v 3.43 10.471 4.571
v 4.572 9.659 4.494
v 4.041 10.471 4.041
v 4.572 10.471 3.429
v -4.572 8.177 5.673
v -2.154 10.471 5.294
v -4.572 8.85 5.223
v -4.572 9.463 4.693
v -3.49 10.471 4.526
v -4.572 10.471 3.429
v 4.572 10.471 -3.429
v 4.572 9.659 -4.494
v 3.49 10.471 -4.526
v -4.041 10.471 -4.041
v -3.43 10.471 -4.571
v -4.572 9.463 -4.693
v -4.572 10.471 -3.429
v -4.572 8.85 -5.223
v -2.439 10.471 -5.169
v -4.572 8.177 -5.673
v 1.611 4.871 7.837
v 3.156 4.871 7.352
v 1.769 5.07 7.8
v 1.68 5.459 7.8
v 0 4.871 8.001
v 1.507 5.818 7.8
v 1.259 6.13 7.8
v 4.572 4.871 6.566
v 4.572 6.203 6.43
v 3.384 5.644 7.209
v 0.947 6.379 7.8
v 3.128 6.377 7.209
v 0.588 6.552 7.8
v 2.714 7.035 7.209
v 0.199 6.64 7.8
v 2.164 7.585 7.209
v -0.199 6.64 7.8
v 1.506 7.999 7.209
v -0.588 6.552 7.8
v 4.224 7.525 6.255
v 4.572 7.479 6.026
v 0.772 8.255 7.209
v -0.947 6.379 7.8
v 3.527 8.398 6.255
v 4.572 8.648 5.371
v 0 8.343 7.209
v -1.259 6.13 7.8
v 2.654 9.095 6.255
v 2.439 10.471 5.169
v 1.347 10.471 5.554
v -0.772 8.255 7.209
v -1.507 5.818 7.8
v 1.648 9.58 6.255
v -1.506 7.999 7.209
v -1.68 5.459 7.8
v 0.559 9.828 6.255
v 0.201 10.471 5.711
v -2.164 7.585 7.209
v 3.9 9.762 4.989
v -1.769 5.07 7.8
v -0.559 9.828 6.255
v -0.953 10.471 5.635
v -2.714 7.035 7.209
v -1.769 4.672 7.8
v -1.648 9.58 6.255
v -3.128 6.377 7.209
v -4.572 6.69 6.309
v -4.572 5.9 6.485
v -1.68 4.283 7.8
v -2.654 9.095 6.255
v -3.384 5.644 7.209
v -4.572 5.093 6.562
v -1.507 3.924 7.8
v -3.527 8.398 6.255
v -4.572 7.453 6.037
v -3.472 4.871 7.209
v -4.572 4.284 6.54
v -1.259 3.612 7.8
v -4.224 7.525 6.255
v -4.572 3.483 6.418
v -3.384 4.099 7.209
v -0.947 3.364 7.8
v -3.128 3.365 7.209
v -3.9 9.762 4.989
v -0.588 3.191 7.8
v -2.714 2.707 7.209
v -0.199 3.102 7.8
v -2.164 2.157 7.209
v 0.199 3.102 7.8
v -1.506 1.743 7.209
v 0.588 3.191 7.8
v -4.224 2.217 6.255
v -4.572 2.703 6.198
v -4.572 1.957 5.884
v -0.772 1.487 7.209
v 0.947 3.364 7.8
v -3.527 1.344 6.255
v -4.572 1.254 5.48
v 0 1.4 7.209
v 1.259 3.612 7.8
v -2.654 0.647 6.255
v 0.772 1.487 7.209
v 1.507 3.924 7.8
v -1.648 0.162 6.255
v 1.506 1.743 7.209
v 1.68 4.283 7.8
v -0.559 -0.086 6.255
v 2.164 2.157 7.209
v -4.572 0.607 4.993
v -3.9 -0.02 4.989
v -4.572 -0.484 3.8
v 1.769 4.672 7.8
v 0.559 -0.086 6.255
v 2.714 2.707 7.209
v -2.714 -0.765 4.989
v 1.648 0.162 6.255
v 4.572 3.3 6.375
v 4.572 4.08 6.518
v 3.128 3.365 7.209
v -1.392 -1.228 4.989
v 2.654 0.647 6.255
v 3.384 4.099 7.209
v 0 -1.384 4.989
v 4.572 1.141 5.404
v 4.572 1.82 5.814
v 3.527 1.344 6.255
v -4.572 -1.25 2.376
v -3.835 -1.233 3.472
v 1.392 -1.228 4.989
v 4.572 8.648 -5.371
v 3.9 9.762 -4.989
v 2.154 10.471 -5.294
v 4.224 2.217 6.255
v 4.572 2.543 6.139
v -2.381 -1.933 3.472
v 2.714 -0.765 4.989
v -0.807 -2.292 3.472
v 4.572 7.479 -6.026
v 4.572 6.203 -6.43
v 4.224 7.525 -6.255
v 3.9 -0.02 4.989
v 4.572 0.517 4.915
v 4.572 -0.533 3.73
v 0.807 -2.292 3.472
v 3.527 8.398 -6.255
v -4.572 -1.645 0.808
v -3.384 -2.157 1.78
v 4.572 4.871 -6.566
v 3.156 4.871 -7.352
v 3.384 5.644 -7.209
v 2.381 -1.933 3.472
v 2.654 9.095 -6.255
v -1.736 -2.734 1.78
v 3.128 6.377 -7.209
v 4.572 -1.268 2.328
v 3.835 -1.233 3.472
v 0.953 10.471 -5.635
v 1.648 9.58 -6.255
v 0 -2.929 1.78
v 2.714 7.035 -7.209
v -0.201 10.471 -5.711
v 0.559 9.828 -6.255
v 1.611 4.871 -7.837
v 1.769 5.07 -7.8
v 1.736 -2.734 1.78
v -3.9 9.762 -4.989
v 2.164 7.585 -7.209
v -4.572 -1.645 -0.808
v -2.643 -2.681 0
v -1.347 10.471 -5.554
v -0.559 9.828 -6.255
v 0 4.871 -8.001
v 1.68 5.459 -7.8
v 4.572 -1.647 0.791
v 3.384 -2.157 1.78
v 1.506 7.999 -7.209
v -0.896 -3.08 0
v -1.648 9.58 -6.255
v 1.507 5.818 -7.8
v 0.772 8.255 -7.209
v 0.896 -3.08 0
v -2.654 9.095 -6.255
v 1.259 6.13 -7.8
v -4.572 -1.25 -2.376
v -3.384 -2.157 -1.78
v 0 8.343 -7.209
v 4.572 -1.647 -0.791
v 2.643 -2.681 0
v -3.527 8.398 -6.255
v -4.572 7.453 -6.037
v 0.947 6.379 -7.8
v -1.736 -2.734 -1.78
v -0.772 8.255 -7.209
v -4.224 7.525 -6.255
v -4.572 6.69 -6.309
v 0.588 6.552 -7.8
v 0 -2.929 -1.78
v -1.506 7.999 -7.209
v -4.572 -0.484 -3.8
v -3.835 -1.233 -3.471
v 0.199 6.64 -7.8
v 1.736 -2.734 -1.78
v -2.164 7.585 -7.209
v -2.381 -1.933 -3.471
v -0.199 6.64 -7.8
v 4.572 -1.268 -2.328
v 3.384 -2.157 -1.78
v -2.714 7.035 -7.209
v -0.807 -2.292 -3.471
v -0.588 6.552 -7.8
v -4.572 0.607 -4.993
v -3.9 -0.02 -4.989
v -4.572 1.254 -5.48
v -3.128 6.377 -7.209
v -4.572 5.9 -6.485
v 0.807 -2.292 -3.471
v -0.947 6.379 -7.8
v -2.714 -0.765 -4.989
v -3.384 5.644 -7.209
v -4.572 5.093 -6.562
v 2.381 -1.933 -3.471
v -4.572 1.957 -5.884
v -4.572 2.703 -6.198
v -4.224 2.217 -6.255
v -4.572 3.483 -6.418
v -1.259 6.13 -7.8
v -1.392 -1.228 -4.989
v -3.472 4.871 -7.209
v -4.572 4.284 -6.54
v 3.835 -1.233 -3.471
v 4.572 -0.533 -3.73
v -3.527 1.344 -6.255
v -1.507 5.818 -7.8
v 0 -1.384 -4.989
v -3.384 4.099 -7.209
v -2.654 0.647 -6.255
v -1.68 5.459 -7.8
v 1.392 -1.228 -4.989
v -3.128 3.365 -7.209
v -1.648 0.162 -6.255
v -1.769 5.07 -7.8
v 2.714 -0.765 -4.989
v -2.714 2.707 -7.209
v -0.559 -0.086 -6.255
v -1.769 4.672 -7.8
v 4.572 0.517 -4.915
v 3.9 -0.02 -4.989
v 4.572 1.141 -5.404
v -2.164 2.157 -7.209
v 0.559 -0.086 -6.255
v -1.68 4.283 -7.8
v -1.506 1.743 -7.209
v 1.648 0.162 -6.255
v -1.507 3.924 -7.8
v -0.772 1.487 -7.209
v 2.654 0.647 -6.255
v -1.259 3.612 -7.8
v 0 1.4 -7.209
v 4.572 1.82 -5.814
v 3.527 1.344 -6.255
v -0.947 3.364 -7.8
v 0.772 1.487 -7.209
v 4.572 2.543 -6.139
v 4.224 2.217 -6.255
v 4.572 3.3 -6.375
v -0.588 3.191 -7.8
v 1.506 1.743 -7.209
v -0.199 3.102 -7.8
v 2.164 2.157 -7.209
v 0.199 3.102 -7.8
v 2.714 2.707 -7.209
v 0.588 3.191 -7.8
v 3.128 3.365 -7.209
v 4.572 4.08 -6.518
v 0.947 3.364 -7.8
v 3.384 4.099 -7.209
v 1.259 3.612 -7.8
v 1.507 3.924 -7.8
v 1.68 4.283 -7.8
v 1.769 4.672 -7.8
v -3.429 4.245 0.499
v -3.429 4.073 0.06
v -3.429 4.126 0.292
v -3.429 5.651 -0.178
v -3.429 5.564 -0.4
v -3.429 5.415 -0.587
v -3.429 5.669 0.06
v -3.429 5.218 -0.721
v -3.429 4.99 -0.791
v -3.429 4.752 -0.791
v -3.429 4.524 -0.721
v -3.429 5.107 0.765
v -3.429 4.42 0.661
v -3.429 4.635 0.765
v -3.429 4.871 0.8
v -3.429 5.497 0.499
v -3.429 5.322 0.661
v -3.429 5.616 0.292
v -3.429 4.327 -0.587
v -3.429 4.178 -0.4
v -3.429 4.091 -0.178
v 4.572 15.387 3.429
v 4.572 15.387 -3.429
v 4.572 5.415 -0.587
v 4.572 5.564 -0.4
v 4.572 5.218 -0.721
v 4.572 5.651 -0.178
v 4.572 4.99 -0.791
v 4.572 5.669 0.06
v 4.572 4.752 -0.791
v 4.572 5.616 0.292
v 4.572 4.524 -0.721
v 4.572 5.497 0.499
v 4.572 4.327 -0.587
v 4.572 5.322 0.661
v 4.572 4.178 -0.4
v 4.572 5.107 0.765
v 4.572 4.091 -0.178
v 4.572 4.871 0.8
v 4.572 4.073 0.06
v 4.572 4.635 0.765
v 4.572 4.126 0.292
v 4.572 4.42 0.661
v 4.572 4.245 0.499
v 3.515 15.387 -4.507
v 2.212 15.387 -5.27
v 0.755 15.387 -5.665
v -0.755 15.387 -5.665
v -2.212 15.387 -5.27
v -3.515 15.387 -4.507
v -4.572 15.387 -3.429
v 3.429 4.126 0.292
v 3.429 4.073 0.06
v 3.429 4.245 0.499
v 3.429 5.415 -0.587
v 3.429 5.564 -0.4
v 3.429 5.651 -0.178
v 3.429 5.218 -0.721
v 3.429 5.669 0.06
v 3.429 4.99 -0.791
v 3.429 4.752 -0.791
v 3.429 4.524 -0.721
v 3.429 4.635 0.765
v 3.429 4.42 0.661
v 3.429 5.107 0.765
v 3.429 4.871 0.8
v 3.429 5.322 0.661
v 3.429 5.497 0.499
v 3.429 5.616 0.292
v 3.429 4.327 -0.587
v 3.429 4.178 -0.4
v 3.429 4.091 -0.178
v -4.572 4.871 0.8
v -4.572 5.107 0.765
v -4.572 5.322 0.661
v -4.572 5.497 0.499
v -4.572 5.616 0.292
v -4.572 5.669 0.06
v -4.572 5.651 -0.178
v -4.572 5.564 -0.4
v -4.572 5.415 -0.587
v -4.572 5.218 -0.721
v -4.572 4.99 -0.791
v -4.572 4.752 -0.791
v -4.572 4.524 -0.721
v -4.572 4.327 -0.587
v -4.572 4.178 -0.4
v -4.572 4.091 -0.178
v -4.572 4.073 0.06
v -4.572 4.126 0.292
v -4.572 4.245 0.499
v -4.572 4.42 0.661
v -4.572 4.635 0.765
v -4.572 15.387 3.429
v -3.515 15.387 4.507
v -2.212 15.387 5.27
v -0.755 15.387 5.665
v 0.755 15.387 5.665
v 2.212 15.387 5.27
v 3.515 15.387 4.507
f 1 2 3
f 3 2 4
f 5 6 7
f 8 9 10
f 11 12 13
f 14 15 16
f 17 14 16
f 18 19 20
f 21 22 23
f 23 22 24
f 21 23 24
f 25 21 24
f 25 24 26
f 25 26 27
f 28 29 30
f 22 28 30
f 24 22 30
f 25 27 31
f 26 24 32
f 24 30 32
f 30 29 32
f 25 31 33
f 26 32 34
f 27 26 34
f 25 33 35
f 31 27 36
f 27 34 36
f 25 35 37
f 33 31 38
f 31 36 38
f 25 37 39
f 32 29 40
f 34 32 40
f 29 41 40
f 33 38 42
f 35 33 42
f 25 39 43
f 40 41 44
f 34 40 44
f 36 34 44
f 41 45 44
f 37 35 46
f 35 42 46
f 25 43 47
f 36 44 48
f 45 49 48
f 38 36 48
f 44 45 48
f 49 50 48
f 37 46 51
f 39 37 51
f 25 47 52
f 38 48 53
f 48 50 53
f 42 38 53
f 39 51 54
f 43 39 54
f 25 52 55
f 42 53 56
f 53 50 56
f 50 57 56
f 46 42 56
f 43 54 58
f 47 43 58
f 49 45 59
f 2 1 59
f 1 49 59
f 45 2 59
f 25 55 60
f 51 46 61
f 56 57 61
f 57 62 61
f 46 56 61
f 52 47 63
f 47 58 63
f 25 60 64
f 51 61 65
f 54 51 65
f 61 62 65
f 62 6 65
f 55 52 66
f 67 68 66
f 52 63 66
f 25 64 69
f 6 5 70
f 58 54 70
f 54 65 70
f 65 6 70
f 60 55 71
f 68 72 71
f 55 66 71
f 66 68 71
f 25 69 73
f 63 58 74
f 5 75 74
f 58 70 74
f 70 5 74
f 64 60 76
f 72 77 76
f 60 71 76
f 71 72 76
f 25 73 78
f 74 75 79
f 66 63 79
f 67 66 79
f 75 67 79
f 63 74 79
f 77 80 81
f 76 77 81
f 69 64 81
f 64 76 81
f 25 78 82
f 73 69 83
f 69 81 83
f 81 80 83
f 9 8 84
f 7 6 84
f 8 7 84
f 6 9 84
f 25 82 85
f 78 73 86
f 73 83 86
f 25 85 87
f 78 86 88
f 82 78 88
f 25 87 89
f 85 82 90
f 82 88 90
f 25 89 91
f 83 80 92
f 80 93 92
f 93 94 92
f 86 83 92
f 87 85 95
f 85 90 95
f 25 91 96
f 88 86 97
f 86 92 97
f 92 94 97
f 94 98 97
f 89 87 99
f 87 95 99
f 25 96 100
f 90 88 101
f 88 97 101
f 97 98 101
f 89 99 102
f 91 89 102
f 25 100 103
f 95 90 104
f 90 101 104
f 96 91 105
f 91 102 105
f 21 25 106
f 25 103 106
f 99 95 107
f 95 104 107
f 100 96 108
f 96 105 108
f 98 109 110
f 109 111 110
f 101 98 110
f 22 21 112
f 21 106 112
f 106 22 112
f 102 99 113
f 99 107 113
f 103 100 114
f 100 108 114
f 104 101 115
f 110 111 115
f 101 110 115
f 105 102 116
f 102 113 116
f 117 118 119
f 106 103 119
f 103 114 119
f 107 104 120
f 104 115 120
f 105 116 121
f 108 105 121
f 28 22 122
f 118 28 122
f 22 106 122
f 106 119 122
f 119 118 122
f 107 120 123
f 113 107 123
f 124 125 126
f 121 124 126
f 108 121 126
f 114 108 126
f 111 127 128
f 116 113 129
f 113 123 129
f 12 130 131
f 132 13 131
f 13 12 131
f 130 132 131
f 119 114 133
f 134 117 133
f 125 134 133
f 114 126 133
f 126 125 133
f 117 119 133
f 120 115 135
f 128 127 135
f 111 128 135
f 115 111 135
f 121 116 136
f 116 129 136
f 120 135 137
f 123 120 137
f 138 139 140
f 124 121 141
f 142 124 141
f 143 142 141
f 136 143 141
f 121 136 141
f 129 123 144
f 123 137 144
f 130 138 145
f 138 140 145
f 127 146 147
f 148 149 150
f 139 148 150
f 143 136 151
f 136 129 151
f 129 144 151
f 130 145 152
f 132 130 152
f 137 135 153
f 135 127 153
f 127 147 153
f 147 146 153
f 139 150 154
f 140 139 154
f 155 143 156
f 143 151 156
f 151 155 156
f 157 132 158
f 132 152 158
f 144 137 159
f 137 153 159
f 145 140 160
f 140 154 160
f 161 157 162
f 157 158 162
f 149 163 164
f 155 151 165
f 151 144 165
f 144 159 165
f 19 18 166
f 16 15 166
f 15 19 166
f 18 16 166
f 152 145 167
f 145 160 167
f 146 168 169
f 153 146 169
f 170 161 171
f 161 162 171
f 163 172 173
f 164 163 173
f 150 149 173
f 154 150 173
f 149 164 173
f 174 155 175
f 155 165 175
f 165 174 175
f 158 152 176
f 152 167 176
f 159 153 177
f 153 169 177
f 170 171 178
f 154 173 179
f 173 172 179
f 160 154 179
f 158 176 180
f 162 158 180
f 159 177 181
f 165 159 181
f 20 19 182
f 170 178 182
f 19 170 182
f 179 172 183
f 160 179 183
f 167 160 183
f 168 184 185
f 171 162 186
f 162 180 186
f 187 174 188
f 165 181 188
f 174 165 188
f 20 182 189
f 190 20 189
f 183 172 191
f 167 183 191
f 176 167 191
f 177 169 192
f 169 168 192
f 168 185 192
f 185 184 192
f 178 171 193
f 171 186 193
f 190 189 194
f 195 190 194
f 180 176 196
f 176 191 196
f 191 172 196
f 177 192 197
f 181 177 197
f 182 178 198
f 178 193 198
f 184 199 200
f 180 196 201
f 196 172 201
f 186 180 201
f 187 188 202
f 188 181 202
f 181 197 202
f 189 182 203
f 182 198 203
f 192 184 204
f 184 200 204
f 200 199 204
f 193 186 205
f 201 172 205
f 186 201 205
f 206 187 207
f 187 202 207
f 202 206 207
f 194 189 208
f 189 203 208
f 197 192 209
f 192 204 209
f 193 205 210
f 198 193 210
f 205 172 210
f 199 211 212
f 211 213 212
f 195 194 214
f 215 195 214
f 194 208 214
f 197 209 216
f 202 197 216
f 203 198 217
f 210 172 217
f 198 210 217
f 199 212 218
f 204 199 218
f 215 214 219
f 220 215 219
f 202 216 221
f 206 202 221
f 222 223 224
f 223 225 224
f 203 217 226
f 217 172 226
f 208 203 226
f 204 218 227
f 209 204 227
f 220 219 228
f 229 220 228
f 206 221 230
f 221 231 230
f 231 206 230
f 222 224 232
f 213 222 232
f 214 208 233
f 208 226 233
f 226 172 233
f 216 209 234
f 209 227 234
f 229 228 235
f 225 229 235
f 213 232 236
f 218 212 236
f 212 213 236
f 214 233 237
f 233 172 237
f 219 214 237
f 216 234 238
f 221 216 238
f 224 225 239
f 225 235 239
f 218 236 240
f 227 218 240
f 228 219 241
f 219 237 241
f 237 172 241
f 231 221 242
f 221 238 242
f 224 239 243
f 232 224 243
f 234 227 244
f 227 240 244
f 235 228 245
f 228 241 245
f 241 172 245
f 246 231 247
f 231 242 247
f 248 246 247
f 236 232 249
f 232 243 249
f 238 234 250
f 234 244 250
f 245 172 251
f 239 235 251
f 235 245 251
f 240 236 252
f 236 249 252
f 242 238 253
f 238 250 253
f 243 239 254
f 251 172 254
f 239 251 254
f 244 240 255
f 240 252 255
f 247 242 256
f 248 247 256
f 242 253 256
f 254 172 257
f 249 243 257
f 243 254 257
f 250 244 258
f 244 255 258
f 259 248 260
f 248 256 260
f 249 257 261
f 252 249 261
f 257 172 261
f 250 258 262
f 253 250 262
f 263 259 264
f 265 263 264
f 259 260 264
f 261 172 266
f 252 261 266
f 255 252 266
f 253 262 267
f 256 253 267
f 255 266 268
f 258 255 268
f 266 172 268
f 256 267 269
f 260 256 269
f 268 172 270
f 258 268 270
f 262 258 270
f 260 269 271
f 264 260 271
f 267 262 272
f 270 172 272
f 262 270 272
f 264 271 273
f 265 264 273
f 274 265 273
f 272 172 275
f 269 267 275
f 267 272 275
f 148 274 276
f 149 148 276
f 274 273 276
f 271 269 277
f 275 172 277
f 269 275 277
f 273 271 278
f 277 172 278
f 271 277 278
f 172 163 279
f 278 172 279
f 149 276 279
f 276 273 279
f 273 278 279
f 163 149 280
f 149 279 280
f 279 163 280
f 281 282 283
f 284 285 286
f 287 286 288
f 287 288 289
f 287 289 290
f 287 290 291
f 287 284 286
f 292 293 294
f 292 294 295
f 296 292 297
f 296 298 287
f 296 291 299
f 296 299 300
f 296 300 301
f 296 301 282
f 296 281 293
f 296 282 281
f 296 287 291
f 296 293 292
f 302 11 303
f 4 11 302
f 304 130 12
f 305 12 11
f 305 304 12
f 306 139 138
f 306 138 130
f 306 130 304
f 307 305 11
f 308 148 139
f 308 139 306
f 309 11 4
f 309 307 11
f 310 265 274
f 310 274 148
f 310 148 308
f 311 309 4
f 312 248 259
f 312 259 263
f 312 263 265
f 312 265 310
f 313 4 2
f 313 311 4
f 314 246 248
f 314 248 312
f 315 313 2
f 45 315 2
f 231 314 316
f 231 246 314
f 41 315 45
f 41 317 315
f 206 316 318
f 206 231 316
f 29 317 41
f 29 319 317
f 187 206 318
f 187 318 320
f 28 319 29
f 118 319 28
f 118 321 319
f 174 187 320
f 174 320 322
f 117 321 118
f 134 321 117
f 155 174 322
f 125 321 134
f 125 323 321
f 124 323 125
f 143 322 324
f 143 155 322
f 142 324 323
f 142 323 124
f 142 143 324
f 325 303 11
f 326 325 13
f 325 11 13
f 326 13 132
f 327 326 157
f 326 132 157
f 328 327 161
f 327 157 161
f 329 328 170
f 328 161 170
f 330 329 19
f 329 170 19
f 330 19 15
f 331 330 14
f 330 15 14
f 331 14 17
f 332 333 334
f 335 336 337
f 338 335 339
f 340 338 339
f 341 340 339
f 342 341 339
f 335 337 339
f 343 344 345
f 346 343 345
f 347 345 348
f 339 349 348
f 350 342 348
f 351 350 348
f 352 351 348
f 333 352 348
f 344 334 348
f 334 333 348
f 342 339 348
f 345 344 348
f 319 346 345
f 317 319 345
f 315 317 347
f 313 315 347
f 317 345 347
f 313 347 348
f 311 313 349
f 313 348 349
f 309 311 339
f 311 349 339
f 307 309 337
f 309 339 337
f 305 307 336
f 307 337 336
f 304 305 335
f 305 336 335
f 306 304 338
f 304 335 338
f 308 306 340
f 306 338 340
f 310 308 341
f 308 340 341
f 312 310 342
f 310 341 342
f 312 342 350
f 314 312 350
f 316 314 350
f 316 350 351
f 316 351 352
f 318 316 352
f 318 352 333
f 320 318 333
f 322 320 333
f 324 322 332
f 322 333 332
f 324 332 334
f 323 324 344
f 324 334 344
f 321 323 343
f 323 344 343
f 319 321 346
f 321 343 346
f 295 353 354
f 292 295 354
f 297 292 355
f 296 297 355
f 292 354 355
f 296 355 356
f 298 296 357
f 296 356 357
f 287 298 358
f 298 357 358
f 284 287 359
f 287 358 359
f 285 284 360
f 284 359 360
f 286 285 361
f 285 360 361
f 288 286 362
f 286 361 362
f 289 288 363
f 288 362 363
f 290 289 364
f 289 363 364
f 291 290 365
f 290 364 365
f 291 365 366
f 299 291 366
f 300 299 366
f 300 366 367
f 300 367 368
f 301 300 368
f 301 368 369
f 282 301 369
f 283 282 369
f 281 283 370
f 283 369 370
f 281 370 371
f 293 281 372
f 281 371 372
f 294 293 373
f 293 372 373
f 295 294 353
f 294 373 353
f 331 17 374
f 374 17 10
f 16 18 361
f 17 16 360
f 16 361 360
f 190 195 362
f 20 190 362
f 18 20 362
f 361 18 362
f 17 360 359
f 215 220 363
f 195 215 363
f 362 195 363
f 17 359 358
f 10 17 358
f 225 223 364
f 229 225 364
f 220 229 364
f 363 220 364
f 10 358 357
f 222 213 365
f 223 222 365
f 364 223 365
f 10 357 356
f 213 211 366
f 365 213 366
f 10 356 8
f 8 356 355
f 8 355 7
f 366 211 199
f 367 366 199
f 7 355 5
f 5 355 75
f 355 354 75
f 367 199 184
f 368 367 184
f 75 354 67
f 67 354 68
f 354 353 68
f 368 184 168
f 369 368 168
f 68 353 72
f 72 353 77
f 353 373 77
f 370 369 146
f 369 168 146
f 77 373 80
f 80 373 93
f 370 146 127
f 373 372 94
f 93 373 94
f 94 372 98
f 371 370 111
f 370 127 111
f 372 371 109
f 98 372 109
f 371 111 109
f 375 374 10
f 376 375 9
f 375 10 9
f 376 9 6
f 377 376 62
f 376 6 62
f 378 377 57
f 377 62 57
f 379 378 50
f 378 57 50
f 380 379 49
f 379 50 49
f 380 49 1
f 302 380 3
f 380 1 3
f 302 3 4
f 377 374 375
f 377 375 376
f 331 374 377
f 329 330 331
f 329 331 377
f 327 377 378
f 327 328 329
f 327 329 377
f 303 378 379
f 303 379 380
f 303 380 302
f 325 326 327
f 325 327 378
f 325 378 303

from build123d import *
from build123d.topology import SkipClean

# Parameters (mm, degrees)
CUT_EXTRUDE1_DEPTH      = 35
CUT_EXTRUDE1_DEPTH_BACK = 35
SKETCH2_OUTSIDE_W       = 96.248
SKETCH2_OUTSIDE_H       = 96.248
BOSS_EXTRUDE1_DEPTH     = 46
SKETCH4_R               = 3.5
CUT_EXTRUDE2_DEPTH      = 5
LPATTERN1_COUNT         = 2
LPATTERN1_PITCH         = 35
SCALE1_SCALE            = 0.2286


with BuildPart() as part:
    # Sketch1 → Revolve2 (revolve)
    with BuildSketch(Plane(origin=(0, 0, 0), x_dir=(1, 0, 0), z_dir=(0, 1, 0))):
        with BuildLine():
            Line((0, 35), (0, -35))
            ThreePointArc((0, -35), (35, 0), (0, 35))
        make_face()
    revolve(axis=Axis((0, 0, -35), (0, 0, 1)))

    # Sketch2 outside → Cut-Extrude1 (cut, two sides: drawn at the far end of the back side and taken through both)
    with SkipClean():  # the faces are left unmerged after this step: merging them gives an invalid solid
        with BuildSketch(Plane(origin=(0, 0, 0), x_dir=(1, 0, 0), z_dir=(0, 1, 0)).offset(-CUT_EXTRUDE1_DEPTH_BACK)):
            Rectangle(SKETCH2_OUTSIDE_W, SKETCH2_OUTSIDE_H)
            with BuildLine():
                Line((-20, -28.722813233), (-20, 28.722813233))
                ThreePointArc((-20, 28.722813233), (0, 35), (20, 28.722813233))
                Line((20, 28.722813233), (20, -28.722813233))
                ThreePointArc((20, -28.722813233), (0, -35), (-20, -28.722813233))
            make_face(mode=Mode.SUBTRACT)
        extrude(amount=CUT_EXTRUDE1_DEPTH + CUT_EXTRUDE1_DEPTH_BACK, mode=Mode.SUBTRACT)

    # Sketch3 → Boss-Extrude1 (add)
    with BuildSketch(Plane(origin=(0, 0, 0), x_dir=(1, 0, 0), z_dir=(0, 1, 0))):
        with BuildLine():
            Line((-20, 15), (-20, -15))
            ThreePointArc((-20, -15), (0, -25), (20, -15))
            Line((20, -15), (20, 15))
            ThreePointArc((20, 15), (0, 25), (-20, 15))
        make_face()
    extrude(amount=BOSS_EXTRUDE1_DEPTH)

    # Sketch4 → Cut-Extrude2 (cut)
    with BuildSketch(Plane.ZY.offset(20)):
        Circle(SKETCH4_R)
    cut_extrude2 = extrude(amount=-CUT_EXTRUDE2_DEPTH, mode=Mode.SUBTRACT)

    # LPattern1: Cut-Extrude2 ×2
    with Locations(*[(i * LPATTERN1_PITCH, 0, 0) for i in range(1, LPATTERN1_COUNT)]):
        add(cut_extrude2, mode=Mode.SUBTRACT)


with BuildPart() as part_1:
    # Scale1: scaled about (-2.48e-07, 6.314524212, 6.409e-06)
    add(part.part.scale(SCALE1_SCALE).moved(Location((-1.91e-07, 4.871023977, 4.944e-06))))


solid = part_1.part
